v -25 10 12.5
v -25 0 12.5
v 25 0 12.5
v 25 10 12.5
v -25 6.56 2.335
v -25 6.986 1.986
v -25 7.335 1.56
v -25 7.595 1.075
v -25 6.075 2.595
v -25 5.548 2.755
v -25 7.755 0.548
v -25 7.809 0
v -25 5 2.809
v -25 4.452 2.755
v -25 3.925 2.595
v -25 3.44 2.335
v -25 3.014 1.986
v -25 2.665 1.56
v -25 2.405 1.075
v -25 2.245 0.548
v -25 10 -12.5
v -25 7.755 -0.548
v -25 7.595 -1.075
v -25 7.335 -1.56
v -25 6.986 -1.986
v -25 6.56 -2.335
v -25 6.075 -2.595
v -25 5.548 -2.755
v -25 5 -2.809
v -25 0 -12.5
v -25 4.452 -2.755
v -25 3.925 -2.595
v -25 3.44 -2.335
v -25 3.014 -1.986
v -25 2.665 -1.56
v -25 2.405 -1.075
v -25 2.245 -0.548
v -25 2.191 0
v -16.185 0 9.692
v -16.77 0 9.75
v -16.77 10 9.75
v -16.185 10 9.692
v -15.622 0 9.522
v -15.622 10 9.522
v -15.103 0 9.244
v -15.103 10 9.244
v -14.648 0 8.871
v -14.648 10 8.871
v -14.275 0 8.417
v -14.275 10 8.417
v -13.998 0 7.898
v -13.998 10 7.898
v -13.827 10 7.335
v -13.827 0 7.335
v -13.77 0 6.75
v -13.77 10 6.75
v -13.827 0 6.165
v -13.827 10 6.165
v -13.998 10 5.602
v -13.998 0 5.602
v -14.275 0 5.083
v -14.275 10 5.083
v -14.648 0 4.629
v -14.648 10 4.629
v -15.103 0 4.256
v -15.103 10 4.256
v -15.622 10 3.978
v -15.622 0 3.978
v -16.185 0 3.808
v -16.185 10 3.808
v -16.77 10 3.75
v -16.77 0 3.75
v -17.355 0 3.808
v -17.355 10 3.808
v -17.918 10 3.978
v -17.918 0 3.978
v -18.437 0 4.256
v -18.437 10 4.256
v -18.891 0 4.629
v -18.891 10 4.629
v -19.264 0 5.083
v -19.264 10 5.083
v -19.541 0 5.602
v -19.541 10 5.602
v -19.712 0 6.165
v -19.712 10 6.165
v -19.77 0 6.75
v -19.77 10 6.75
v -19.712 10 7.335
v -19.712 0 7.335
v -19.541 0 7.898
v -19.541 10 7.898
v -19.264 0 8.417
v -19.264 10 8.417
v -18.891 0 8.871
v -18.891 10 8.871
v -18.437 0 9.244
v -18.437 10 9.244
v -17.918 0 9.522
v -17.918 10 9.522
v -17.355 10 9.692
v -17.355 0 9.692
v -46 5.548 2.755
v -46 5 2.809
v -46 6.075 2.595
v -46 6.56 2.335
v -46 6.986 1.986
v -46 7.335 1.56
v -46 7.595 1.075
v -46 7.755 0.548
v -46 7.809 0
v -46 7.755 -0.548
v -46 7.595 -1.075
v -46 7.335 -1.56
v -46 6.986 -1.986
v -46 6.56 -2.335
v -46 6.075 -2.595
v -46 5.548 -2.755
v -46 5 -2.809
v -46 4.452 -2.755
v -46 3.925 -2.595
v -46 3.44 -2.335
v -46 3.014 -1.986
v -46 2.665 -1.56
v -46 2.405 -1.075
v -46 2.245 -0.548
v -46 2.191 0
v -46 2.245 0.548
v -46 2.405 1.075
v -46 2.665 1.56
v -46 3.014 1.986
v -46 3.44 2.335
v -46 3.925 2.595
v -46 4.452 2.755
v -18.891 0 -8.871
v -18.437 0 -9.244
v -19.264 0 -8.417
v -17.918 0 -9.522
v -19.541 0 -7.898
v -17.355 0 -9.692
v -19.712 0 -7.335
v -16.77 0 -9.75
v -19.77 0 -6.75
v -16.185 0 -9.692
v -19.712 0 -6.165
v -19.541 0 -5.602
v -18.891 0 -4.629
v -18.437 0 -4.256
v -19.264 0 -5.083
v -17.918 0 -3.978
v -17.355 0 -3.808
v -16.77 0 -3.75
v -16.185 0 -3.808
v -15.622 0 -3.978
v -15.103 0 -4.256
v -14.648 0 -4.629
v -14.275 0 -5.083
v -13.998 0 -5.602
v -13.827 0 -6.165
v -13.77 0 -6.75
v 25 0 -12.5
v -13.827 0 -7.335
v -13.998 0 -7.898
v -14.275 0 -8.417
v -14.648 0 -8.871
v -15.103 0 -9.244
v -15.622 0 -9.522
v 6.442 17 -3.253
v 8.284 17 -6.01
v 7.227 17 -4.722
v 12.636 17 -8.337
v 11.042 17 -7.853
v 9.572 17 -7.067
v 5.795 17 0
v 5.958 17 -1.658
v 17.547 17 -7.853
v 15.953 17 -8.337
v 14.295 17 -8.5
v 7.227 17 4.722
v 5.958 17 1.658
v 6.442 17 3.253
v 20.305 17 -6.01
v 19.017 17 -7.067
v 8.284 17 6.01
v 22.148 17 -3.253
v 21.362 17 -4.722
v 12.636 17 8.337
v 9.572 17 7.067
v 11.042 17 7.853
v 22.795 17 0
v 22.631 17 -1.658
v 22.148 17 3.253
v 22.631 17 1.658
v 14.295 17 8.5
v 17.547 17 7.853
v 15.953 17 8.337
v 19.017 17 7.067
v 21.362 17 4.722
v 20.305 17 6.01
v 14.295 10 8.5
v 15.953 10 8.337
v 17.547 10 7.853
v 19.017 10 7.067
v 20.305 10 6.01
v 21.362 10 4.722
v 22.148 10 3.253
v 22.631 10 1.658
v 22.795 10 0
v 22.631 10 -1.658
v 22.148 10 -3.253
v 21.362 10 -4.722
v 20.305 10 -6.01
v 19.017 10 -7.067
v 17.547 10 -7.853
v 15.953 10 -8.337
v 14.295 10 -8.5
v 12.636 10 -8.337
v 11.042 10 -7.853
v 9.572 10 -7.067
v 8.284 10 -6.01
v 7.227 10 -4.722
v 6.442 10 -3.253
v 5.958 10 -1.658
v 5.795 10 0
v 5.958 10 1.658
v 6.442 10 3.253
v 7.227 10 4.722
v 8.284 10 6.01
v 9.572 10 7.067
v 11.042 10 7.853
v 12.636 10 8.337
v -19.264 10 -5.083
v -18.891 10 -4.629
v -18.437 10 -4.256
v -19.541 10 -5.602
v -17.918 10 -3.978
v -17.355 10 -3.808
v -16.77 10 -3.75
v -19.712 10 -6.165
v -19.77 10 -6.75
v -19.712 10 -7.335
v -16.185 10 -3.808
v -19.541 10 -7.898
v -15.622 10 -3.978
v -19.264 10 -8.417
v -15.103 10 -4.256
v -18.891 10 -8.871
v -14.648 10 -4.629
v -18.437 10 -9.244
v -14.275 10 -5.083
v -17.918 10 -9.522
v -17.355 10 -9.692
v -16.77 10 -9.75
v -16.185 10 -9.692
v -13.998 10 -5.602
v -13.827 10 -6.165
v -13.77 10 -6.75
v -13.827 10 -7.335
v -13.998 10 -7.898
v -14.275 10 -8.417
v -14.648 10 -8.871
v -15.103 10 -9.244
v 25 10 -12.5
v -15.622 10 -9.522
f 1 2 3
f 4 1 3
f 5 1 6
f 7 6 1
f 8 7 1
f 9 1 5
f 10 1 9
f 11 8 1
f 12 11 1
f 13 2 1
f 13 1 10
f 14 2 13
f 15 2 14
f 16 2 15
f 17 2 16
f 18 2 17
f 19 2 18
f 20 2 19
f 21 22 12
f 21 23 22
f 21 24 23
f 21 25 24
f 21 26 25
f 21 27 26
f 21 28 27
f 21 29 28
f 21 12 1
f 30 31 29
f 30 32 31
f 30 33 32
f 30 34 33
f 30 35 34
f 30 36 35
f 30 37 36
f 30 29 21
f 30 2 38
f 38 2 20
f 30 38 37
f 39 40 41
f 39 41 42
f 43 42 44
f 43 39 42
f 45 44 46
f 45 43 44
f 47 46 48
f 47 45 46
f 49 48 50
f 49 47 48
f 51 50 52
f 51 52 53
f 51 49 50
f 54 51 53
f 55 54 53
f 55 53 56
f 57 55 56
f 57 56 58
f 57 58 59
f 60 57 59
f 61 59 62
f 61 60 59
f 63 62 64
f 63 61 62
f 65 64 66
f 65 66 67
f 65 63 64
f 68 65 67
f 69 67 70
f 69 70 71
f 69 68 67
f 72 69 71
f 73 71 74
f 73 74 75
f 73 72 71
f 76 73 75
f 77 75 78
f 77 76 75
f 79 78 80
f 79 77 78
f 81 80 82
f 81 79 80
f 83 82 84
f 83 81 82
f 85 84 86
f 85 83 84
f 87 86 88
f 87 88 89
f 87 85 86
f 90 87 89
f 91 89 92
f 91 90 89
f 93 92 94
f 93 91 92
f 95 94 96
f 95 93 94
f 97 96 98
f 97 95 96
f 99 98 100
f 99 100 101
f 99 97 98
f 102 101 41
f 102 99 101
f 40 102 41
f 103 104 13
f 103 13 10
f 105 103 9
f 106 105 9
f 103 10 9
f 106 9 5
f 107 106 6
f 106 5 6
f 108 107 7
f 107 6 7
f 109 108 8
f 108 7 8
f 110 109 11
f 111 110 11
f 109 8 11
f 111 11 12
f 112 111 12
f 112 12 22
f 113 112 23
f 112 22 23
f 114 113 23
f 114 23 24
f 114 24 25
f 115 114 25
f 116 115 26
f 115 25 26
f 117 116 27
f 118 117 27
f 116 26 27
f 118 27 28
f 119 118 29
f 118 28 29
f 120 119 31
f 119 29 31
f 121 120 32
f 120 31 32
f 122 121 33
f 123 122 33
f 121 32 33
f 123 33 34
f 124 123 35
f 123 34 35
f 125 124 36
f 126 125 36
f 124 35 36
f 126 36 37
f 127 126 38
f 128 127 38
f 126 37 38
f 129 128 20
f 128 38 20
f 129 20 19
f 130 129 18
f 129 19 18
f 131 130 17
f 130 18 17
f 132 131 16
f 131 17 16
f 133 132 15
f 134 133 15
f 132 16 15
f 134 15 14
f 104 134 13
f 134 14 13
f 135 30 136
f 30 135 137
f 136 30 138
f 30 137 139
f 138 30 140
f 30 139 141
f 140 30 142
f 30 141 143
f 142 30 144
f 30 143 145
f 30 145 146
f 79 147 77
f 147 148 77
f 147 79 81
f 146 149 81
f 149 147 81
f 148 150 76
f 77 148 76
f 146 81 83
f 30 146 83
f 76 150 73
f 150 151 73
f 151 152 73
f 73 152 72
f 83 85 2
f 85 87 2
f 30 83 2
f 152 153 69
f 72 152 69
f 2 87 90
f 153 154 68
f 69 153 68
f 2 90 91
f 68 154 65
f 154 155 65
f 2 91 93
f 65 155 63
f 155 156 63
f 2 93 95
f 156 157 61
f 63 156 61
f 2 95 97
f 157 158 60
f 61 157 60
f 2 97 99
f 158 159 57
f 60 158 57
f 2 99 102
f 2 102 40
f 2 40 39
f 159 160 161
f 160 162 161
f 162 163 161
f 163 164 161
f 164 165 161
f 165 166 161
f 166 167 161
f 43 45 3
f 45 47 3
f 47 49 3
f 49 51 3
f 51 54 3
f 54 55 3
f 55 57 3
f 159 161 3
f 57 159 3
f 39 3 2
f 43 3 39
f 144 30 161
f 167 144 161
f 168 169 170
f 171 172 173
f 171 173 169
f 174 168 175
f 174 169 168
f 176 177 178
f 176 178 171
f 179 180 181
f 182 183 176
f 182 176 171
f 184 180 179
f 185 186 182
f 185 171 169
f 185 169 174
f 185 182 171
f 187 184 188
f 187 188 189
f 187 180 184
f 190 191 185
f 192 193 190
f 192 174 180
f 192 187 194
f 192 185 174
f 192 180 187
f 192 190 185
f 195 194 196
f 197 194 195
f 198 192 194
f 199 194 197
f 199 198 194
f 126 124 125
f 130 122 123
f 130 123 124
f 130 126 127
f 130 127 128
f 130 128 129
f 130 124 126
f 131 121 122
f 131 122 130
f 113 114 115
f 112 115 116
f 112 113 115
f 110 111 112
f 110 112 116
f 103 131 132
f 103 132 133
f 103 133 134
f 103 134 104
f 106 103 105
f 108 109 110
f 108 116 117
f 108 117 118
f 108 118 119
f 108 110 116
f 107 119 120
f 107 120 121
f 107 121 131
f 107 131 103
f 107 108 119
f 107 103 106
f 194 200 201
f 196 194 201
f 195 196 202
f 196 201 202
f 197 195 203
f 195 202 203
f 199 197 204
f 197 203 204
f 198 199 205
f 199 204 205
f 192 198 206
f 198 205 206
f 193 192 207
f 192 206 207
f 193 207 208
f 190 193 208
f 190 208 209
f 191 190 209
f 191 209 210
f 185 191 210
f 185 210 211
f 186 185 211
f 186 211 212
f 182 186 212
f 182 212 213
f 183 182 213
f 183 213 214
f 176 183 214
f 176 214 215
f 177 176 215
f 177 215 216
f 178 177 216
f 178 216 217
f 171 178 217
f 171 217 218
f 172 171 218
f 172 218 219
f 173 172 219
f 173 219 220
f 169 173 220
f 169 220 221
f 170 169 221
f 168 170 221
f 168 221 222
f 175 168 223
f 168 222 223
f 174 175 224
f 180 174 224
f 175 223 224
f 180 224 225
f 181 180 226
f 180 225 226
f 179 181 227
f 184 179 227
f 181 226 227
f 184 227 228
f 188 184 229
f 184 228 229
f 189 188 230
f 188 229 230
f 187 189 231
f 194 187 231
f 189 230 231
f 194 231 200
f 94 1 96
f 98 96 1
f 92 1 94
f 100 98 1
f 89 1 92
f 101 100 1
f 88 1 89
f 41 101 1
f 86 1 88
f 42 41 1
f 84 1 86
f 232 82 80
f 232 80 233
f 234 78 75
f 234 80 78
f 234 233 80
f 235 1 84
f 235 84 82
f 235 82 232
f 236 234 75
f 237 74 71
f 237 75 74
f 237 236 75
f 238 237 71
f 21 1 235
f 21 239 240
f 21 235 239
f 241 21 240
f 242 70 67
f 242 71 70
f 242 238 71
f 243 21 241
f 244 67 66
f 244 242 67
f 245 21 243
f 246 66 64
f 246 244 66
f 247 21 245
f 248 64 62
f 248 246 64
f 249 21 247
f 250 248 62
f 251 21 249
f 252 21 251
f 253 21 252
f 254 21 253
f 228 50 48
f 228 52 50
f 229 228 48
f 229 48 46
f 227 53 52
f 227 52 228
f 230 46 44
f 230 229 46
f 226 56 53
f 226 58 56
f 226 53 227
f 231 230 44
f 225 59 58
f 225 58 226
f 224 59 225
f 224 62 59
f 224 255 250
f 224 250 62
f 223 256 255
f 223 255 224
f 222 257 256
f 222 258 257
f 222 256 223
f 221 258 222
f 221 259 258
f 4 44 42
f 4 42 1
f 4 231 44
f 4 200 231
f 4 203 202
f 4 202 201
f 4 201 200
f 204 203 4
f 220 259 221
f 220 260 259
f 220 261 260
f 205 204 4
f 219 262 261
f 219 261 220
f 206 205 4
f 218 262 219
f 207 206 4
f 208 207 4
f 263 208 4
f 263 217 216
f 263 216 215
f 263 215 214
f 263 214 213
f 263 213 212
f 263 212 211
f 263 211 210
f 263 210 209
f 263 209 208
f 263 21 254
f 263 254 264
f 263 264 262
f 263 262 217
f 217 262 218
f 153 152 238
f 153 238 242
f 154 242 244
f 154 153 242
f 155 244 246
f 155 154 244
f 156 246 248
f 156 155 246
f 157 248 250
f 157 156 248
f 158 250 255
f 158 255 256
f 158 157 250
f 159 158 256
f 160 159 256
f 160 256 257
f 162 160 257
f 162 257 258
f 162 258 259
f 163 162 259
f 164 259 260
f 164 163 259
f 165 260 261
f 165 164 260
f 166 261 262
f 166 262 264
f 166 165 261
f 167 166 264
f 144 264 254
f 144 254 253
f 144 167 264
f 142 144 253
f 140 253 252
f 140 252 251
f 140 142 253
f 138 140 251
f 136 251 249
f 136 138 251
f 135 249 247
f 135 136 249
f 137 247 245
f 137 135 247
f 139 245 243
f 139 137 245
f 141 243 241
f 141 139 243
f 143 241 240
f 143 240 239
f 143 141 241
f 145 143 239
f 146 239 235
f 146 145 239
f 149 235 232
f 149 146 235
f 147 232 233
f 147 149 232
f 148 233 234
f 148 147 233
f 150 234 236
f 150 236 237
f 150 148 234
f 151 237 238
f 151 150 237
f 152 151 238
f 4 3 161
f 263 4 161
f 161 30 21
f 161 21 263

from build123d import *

# Parameters (mm, degrees)
SKETCH_1_W      = 50
SKETCH_1_H      = 25
SKETCH_1_R      = 3
EXTRUDE_1_DEPTH = 10
SKETCH_2_R      = 2.808756841
EXTRUDE_2_DEPTH = 21
SKETCH_1_3_R    = 8.5
EXTRUDE_3_DEPTH = 17


with BuildPart() as part:
    # 草图1 → 凸台-拉伸1 (new body)
    with BuildSketch(Plane(origin=(0, 0, 0), x_dir=(1, 0, 0), z_dir=(0, 1, 0))):
        Rectangle(SKETCH_1_W, SKETCH_1_H)
        with Locations((-16.76980198, -6.75)):
            Circle(SKETCH_1_R, mode=Mode.SUBTRACT)
        with Locations((-16.76980198, 6.75)):
            Circle(SKETCH_1_R, mode=Mode.SUBTRACT)
    extrude(amount=EXTRUDE_1_DEPTH)

    # 草图2 → 凸台-拉伸2 (add)
    with BuildSketch(Plane.ZY.offset(25)):
        with Locations((0, 5)):
            Circle(SKETCH_2_R)
    extrude(amount=EXTRUDE_2_DEPTH)

    # 草图1<3> → 凸台-拉伸3 (add)
    with BuildSketch(Plane(origin=(0, 0, 0), x_dir=(1, 0, 0), z_dir=(0, 1, 0))):
        with Locations((14.294554455, 0)):
            Circle(SKETCH_1_3_R)
    extrude(amount=EXTRUDE_3_DEPTH)


solid = part.part
